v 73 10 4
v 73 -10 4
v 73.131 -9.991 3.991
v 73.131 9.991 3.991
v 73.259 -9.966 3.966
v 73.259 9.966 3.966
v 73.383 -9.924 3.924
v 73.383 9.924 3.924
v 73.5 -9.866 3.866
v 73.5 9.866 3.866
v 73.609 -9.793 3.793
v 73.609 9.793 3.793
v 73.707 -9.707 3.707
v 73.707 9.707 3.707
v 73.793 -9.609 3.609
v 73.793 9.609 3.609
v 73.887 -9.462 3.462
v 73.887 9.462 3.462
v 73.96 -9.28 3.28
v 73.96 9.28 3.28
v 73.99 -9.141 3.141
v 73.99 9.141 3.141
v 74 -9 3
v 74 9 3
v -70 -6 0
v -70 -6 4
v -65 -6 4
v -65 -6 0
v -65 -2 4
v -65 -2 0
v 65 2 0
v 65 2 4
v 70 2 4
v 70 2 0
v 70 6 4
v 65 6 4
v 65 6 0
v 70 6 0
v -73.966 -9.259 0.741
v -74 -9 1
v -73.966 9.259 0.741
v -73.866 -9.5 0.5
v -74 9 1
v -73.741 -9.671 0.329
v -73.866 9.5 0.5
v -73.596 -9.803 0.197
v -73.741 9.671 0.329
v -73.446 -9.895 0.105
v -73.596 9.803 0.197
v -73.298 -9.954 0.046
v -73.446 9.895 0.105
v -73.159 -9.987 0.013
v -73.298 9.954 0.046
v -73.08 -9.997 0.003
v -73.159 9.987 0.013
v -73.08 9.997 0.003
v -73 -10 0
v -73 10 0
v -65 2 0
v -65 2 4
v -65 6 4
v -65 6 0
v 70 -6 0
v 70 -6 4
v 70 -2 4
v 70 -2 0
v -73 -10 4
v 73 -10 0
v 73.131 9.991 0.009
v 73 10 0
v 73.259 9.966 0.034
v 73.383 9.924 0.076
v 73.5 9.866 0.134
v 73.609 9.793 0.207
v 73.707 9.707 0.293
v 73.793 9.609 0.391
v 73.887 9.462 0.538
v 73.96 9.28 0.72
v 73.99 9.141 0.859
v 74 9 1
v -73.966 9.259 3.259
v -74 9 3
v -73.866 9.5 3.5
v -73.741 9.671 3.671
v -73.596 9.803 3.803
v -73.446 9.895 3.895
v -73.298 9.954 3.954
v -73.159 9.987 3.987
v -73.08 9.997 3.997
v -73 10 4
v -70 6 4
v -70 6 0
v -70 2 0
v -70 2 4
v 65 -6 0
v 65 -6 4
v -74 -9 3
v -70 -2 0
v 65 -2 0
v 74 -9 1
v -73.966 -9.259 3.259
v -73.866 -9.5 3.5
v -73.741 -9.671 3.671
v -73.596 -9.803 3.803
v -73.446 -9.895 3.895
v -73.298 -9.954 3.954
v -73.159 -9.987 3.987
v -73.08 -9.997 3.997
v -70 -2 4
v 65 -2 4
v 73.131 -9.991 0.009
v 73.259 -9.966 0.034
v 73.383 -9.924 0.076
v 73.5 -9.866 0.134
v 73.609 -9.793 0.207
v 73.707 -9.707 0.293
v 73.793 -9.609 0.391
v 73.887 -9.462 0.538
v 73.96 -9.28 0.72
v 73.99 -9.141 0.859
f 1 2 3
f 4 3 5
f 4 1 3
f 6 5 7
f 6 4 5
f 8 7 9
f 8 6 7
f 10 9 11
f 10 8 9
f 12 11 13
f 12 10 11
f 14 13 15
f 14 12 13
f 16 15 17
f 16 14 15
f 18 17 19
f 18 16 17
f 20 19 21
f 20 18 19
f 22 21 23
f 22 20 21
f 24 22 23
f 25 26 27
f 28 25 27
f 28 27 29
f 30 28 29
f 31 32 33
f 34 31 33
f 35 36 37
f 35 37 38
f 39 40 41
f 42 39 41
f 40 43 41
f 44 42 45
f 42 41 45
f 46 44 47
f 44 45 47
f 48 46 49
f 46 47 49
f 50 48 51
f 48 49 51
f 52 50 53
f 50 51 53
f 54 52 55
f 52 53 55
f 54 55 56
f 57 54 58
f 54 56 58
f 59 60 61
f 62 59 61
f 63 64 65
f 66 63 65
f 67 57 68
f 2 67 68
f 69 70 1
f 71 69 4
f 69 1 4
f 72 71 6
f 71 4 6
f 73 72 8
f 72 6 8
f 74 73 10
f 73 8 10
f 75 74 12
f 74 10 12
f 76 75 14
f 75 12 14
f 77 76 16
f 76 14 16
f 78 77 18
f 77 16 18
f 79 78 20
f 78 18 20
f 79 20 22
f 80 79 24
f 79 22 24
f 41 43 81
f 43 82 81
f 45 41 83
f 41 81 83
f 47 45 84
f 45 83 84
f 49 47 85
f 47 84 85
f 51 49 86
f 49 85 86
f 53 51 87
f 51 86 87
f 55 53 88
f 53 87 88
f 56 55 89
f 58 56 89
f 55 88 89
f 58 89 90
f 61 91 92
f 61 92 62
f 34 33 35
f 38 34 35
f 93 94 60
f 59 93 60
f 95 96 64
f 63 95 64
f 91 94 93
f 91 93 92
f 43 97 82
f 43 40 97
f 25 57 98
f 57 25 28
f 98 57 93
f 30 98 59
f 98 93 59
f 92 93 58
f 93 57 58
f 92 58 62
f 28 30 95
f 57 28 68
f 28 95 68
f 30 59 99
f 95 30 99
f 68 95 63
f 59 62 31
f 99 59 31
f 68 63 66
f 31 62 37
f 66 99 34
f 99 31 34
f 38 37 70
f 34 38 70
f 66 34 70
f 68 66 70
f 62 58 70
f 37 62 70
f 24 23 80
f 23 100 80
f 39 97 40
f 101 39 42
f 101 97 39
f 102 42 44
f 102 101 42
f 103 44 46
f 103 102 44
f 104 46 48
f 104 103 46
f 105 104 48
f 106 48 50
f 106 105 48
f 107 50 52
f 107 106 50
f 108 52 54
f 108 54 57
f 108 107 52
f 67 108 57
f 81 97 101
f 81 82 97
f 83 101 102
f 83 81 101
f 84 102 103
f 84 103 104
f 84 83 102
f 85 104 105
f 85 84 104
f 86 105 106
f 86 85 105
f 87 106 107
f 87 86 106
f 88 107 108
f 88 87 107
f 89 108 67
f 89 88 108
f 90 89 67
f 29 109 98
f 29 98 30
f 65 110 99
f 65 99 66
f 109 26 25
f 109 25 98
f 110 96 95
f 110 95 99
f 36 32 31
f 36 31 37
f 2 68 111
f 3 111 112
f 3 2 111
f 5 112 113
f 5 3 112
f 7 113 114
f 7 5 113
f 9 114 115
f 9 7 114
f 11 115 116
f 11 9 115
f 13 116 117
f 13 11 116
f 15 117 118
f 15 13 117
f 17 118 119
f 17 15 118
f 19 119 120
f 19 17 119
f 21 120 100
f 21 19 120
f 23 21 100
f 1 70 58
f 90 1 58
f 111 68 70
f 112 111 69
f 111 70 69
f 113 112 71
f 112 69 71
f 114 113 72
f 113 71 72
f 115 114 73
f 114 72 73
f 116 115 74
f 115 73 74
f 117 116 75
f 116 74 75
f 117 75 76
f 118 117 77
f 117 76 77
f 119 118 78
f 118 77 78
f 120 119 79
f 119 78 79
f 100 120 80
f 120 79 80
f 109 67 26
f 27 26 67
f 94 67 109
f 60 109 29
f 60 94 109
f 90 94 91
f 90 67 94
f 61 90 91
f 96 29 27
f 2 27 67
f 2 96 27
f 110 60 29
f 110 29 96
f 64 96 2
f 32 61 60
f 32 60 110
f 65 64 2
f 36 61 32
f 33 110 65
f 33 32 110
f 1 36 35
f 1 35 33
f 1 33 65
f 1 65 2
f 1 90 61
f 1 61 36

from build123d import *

# Parameters (mm, degrees)
SKETCH_1_W          = 74
SKETCH_1_H          = 20
EXTRUDE_1_DEPTH     = 4
SKETCH_2_W          = 5
SKETCH_2_H          = 4
CUT_EXTRUDE_1_DEPTH = 5
FILLET_1_R          = 1


with BuildPart() as part:
    # 草图1 → 凸台-拉伸1 (new body)
    with BuildSketch(Plane.XY):
        with Locations((-37, 0)):
            Rectangle(SKETCH_1_W, SKETCH_1_H)
        with Locations((37, 0)):
            Rectangle(SKETCH_1_W, SKETCH_1_H)
    extrude(amount=EXTRUDE_1_DEPTH)

    # 草图2 → 切除-拉伸1 (cut)
    with BuildSketch(Plane.XY.offset(4)):
        with Locations((-67.5, -4)):
            Rectangle(SKETCH_2_W, SKETCH_2_H)
        with Locations((-67.5, 4)):
            Rectangle(SKETCH_2_W, SKETCH_2_H)
        with Locations((67.5, 4)):
            Rectangle(SKETCH_2_W, SKETCH_2_H)
        with Locations((67.5, -4)):
            Rectangle(SKETCH_2_W, SKETCH_2_H)
    extrude(amount=-CUT_EXTRUDE_1_DEPTH, mode=Mode.SUBTRACT)

    # 圆角1
    fillet_1_edges = [part.edges().sort_by_distance(p)[0] for p in [
        (-74, 0, 4),
        (74, 0, 4),
        (74, 0, 0),
        (-74, 0, 0),
        (74, 10, 2),
        (74, -10, 2),
        (-74, -10, 2),
        (-74, 10, 2),
    ]]
    fillet(fillet_1_edges, radius=FILLET_1_R)


solid = part.part
